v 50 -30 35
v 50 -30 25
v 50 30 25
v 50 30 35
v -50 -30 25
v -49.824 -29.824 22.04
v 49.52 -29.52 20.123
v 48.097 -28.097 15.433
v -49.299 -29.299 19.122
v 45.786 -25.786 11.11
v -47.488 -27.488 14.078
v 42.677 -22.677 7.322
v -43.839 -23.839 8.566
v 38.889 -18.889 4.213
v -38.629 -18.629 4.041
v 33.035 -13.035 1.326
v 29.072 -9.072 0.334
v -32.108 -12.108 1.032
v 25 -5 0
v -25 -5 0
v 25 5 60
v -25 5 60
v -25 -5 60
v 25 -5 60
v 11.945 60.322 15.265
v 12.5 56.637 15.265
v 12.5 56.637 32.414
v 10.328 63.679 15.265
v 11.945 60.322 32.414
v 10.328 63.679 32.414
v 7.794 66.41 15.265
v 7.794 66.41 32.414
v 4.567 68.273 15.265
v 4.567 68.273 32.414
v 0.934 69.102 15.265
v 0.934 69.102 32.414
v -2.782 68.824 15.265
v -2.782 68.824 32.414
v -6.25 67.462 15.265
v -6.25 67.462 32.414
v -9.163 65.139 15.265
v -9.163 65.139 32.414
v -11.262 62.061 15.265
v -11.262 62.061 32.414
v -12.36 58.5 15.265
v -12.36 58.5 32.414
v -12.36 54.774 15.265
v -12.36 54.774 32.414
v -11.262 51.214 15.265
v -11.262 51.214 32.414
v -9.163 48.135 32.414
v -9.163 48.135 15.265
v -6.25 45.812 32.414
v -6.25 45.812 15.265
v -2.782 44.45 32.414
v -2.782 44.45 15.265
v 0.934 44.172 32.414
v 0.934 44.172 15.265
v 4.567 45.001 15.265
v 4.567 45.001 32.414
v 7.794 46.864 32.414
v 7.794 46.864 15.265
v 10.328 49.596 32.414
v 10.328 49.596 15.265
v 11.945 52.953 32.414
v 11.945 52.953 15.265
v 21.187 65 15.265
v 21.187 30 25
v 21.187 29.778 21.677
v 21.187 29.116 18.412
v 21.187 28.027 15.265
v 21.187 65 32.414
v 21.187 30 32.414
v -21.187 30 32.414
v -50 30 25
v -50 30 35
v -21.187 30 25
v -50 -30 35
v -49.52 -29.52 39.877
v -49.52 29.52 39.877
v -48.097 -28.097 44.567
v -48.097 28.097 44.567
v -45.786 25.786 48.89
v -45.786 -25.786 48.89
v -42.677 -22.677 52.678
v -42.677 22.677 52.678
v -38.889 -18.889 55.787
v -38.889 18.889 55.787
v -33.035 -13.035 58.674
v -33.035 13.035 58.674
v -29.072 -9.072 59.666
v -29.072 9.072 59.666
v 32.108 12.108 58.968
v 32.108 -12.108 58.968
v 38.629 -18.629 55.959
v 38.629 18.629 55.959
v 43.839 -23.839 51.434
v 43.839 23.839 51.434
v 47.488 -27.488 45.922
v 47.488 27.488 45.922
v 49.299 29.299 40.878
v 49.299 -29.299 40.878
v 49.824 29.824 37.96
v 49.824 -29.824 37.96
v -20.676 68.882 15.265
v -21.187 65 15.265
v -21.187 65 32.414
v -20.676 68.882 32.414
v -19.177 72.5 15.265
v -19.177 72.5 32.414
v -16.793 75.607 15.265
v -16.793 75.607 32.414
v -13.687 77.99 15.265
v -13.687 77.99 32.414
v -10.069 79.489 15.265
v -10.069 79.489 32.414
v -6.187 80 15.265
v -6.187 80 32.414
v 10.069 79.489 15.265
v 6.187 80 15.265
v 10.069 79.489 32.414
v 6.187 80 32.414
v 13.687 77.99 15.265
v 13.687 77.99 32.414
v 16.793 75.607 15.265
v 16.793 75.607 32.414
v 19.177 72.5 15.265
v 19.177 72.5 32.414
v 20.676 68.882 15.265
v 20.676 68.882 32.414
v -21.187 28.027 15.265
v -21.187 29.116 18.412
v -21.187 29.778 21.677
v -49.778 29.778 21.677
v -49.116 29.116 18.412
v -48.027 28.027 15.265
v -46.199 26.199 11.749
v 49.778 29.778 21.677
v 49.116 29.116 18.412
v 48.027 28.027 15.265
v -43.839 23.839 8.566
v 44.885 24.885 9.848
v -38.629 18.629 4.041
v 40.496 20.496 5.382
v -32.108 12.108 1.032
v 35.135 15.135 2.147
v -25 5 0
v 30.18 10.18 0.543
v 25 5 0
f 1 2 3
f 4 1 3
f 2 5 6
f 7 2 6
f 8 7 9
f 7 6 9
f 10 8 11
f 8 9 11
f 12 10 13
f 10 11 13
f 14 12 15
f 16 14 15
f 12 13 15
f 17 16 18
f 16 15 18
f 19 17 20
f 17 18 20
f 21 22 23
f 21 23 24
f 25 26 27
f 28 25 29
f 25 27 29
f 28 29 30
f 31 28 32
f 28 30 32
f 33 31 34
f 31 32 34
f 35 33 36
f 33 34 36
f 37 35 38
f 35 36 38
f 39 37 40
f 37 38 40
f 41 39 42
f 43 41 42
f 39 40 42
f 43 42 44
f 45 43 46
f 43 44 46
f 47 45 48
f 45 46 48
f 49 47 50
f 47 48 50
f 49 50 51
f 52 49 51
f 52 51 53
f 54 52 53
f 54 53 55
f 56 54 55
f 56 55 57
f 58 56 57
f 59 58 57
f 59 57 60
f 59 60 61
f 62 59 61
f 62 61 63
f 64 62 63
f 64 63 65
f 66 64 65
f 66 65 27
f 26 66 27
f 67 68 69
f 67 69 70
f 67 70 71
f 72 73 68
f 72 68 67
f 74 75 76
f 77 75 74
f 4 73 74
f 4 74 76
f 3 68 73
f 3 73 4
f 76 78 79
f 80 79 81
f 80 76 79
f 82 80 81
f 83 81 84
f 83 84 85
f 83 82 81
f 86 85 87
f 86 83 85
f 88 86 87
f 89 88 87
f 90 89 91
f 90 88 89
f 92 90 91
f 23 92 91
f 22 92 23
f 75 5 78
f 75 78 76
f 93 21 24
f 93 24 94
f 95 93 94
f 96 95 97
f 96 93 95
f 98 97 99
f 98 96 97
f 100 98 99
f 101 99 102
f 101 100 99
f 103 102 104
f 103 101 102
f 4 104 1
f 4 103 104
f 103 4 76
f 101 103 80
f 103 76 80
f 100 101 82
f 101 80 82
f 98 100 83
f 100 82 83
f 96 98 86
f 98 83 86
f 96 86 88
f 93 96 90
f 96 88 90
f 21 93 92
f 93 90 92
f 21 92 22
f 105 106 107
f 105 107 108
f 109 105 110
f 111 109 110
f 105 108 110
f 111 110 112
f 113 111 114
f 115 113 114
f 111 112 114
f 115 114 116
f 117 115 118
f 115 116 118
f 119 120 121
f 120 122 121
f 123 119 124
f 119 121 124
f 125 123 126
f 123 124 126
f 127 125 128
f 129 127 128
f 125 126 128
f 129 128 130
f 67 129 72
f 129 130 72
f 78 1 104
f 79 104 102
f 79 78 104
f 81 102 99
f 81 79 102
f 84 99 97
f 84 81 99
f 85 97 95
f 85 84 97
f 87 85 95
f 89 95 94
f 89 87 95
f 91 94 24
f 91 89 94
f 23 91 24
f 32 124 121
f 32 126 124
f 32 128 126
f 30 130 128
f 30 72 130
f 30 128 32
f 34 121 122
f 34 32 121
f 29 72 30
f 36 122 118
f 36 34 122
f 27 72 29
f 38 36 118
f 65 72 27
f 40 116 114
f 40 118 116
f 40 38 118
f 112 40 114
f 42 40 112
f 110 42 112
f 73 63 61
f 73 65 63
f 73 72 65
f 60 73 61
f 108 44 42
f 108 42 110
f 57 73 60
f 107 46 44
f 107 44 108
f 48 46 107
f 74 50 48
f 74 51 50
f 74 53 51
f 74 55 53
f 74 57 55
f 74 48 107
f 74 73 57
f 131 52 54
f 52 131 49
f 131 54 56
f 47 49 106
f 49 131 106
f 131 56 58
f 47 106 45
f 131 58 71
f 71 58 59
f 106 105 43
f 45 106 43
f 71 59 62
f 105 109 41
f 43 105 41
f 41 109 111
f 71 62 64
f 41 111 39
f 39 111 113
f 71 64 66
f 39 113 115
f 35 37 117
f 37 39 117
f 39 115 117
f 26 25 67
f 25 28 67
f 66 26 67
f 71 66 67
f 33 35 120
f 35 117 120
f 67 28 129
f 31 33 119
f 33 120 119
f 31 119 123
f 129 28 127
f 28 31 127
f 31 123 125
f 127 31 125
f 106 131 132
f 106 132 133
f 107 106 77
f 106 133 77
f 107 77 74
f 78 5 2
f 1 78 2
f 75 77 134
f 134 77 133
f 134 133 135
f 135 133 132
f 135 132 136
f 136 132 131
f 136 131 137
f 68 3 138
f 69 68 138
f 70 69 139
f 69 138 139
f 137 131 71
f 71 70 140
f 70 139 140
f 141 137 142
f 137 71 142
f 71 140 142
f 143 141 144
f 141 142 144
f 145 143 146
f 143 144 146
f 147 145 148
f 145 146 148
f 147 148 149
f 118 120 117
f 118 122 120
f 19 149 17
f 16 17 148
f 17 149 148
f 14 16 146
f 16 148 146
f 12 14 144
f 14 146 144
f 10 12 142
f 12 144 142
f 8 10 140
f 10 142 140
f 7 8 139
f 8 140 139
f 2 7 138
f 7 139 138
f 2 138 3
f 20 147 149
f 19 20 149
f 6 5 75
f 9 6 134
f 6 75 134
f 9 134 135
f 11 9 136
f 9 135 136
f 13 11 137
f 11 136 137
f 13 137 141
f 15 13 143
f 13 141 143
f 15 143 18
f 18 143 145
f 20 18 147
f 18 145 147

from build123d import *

# Parameters (mm, degrees)
F0_W         = 100
F0_H         = 60
F1_DEPTH     = 60
F2_W         = 42.3733331263
F2_H         = 17.1486828476
F3_DEPTH     = 50
F4_R         = 12.5
F5_DEPTH     = 32.4145003611
F6_T1_DEPTH  = 185
F6_T3_DEPTH  = 225
F6_T8_DEPTH  = 225
F6_T14_DEPTH = 225
F6_T20_DEPTH = 225
F6_T27_DEPTH = 225
F6_T33_DEPTH = 225
F7_R         = 15


# Not quite as in the source:
# - a fillet or chamfer that OpenCascade refuses, or shapes differently, is made with other operations: its cross-section is extruded or revolved along the edge and cut away or added


with BuildPart() as f1:
    # F0 (on Top) → F1 (new body)
    with BuildSketch(Plane.XY):
        Rectangle(F0_W, F0_H)
    extrude(amount=F1_DEPTH)

    # F2 (on face) → F3 (join)
    with BuildSketch(Plane(origin=(0, 30, 0), x_dir=(-1, 0, 0), z_dir=(0, 1, 0))):
        with Locations((0, 23.8391589373)):
            Rectangle(F2_W, F2_H)
    extrude(amount=F3_DEPTH)

    # F4 (on face) → F5 (cut, through all)
    with BuildSketch(Plane.XY.offset(32.4135003611)):
        with Locations((0, 56.6370971501)):
            Circle(F4_R)
    extrude(amount=-F5_DEPTH, mode=Mode.SUBTRACT)

    # F6: fillet of radius 25 on 8 edges, made by hand

    # F6_s2 → F6_t1 (cut)
    with BuildSketch(Plane.XZ.offset(-92.5)):
        with BuildLine():
            ThreePointArc((-50, 35), (-42.6776695297, 52.6776695297), (-25, 60))
            Line((-25, 60), (-50, 60))
            Line((-50, 60), (-50, 35))
        make_face()
        with BuildLine():
            ThreePointArc((25, 60), (42.6776695297, 52.6776695297), (50, 35))
            Line((50, 35), (50, 60))
            Line((50, 60), (25, 60))
        make_face()
        with BuildLine():
            ThreePointArc((-50, 25), (-42.6776695297, 7.3223304703), (-25, 0))
            Line((-25, 0), (-50, 0))
            Line((-50, 0), (-50, 25))
        make_face()
        with BuildLine():
            ThreePointArc((25, 0), (42.6776695297, 7.3223304703), (50, 25))
            Line((50, 25), (50, 0))
            Line((50, 0), (25, 0))
        make_face()
    extrude(amount=F6_T1_DEPTH, mode=Mode.SUBTRACT)

    # F6_s4 → F6_t3 (cut)
    with BuildSketch(Plane.YZ.offset(-112.5)):
        with BuildLine():
            ThreePointArc((-30, 35), (-22.6776695297, 52.6776695297), (-5, 60))
            Line((-5, 60), (-30, 60))
            Line((-30, 60), (-30, 35))
        make_face()
        with BuildLine():
            ThreePointArc((30, 35), (22.6776695297, 52.6776695297), (5, 60))
            Line((5, 60), (30, 60))
            Line((30, 60), (30, 35))
        make_face()
        with BuildLine():
            ThreePointArc((-30, 25), (-22.6776695297, 7.3223304703), (-5, 0))
            Line((-5, 0), (-30, 0))
            Line((-30, 0), (-30, 25))
        make_face()
    extrude(amount=F6_T3_DEPTH, mode=Mode.SUBTRACT)


with BuildPart() as f6_tool6:
    # F6_s7 → F6_t8 (new body)
    with BuildSketch(Plane.YZ.offset(112.5)):
        with BuildLine():
            ThreePointArc((30, 25), (22.6776695297, 7.3223304703), (5, 0))
            Line((5, 0), (30, 0))
            Line((30, 0), (30, 25))
        make_face()
    extrude(amount=-F6_T8_DEPTH)

    split(bisect_by=Plane.XY.offset(15.2648175135), keep=Keep.TOP)

    split(bisect_by=Plane.YZ.offset(21.1866665632), keep=Keep.TOP)


with BuildPart() as f1_1:
    add(f1.part)

    # F6_t5: cut F6_tool6
    add(f6_tool6.part, mode=Mode.SUBTRACT)


with BuildPart() as f6_tool12:
    # F6_s13 → F6_t14 (new body)
    with BuildSketch(Plane.YZ.offset(112.5)):
        with BuildLine():
            ThreePointArc((30, 25), (22.6776695297, 7.3223304703), (5, 0))
            Line((5, 0), (30, 0))
            Line((30, 0), (30, 25))
        make_face()
    extrude(amount=-F6_T14_DEPTH)

    split(bisect_by=Plane.XY.offset(15.2648175135), keep=Keep.BOTTOM)

    split(bisect_by=Plane.YZ.offset(21.1866665632), keep=Keep.TOP)


with BuildPart() as f1_2:
    add(f1_1.part)

    # F6_t11: cut F6_tool12
    add(f6_tool12.part, mode=Mode.SUBTRACT)


with BuildPart() as f6_tool18:
    # F6_s19 → F6_t20 (new body)
    with BuildSketch(Plane.YZ.offset(112.5)):
        with BuildLine():
            ThreePointArc((30, 25), (22.6776695297, 7.3223304703), (5, 0))
            Line((5, 0), (30, 0))
            Line((30, 0), (30, 25))
        make_face()
    extrude(amount=-F6_T20_DEPTH)

    split(bisect_by=Plane.XY.offset(15.2648175135), keep=Keep.BOTTOM)

    split(bisect_by=Plane.YZ.offset(21.1866665632), keep=Keep.BOTTOM)

    split(bisect_by=Plane.YZ.offset(-21.1866665632), keep=Keep.TOP)


with BuildPart() as f1_3:
    add(f1_2.part)

    # F6_t17: cut F6_tool18
    add(f6_tool18.part, mode=Mode.SUBTRACT)


with BuildPart() as f6_tool25:
    # F6_s26 → F6_t27 (new body)
    with BuildSketch(Plane.YZ.offset(112.5)):
        with BuildLine():
            ThreePointArc((30, 25), (22.6776695297, 7.3223304703), (5, 0))
            Line((5, 0), (30, 0))
            Line((30, 0), (30, 25))
        make_face()
    extrude(amount=-F6_T27_DEPTH)

    split(bisect_by=Plane.XY.offset(15.2648175135), keep=Keep.TOP)

    split(bisect_by=Plane.YZ.offset(-21.1866665632), keep=Keep.BOTTOM)


with BuildPart() as f1_4:
    add(f1_3.part)

    # F6_t24: cut F6_tool25
    add(f6_tool25.part, mode=Mode.SUBTRACT)


with BuildPart() as f6_tool31:
    # F6_s32 → F6_t33 (new body)
    with BuildSketch(Plane.YZ.offset(112.5)):
        with BuildLine():
            ThreePointArc((30, 25), (22.6776695297, 7.3223304703), (5, 0))
            Line((5, 0), (30, 0))
            Line((30, 0), (30, 25))
        make_face()
    extrude(amount=-F6_T33_DEPTH)

    split(bisect_by=Plane.XY.offset(15.2648175135), keep=Keep.BOTTOM)

    split(bisect_by=Plane.YZ.offset(-21.1866665632), keep=Keep.BOTTOM)


with BuildPart() as f1_5:
    add(f1_4.part)

    # F6_t30: cut F6_tool31
    add(f6_tool31.part, mode=Mode.SUBTRACT)

    # F7
    f7_edges = [f1_5.edges().sort_by_distance(p)[0] for p in [
        (-21.186667, 80, 23.839159),
        (21.186667, 80, 23.839159),
    ]]
    fillet(f7_edges, radius=F7_R)


solid = f1_5.part
